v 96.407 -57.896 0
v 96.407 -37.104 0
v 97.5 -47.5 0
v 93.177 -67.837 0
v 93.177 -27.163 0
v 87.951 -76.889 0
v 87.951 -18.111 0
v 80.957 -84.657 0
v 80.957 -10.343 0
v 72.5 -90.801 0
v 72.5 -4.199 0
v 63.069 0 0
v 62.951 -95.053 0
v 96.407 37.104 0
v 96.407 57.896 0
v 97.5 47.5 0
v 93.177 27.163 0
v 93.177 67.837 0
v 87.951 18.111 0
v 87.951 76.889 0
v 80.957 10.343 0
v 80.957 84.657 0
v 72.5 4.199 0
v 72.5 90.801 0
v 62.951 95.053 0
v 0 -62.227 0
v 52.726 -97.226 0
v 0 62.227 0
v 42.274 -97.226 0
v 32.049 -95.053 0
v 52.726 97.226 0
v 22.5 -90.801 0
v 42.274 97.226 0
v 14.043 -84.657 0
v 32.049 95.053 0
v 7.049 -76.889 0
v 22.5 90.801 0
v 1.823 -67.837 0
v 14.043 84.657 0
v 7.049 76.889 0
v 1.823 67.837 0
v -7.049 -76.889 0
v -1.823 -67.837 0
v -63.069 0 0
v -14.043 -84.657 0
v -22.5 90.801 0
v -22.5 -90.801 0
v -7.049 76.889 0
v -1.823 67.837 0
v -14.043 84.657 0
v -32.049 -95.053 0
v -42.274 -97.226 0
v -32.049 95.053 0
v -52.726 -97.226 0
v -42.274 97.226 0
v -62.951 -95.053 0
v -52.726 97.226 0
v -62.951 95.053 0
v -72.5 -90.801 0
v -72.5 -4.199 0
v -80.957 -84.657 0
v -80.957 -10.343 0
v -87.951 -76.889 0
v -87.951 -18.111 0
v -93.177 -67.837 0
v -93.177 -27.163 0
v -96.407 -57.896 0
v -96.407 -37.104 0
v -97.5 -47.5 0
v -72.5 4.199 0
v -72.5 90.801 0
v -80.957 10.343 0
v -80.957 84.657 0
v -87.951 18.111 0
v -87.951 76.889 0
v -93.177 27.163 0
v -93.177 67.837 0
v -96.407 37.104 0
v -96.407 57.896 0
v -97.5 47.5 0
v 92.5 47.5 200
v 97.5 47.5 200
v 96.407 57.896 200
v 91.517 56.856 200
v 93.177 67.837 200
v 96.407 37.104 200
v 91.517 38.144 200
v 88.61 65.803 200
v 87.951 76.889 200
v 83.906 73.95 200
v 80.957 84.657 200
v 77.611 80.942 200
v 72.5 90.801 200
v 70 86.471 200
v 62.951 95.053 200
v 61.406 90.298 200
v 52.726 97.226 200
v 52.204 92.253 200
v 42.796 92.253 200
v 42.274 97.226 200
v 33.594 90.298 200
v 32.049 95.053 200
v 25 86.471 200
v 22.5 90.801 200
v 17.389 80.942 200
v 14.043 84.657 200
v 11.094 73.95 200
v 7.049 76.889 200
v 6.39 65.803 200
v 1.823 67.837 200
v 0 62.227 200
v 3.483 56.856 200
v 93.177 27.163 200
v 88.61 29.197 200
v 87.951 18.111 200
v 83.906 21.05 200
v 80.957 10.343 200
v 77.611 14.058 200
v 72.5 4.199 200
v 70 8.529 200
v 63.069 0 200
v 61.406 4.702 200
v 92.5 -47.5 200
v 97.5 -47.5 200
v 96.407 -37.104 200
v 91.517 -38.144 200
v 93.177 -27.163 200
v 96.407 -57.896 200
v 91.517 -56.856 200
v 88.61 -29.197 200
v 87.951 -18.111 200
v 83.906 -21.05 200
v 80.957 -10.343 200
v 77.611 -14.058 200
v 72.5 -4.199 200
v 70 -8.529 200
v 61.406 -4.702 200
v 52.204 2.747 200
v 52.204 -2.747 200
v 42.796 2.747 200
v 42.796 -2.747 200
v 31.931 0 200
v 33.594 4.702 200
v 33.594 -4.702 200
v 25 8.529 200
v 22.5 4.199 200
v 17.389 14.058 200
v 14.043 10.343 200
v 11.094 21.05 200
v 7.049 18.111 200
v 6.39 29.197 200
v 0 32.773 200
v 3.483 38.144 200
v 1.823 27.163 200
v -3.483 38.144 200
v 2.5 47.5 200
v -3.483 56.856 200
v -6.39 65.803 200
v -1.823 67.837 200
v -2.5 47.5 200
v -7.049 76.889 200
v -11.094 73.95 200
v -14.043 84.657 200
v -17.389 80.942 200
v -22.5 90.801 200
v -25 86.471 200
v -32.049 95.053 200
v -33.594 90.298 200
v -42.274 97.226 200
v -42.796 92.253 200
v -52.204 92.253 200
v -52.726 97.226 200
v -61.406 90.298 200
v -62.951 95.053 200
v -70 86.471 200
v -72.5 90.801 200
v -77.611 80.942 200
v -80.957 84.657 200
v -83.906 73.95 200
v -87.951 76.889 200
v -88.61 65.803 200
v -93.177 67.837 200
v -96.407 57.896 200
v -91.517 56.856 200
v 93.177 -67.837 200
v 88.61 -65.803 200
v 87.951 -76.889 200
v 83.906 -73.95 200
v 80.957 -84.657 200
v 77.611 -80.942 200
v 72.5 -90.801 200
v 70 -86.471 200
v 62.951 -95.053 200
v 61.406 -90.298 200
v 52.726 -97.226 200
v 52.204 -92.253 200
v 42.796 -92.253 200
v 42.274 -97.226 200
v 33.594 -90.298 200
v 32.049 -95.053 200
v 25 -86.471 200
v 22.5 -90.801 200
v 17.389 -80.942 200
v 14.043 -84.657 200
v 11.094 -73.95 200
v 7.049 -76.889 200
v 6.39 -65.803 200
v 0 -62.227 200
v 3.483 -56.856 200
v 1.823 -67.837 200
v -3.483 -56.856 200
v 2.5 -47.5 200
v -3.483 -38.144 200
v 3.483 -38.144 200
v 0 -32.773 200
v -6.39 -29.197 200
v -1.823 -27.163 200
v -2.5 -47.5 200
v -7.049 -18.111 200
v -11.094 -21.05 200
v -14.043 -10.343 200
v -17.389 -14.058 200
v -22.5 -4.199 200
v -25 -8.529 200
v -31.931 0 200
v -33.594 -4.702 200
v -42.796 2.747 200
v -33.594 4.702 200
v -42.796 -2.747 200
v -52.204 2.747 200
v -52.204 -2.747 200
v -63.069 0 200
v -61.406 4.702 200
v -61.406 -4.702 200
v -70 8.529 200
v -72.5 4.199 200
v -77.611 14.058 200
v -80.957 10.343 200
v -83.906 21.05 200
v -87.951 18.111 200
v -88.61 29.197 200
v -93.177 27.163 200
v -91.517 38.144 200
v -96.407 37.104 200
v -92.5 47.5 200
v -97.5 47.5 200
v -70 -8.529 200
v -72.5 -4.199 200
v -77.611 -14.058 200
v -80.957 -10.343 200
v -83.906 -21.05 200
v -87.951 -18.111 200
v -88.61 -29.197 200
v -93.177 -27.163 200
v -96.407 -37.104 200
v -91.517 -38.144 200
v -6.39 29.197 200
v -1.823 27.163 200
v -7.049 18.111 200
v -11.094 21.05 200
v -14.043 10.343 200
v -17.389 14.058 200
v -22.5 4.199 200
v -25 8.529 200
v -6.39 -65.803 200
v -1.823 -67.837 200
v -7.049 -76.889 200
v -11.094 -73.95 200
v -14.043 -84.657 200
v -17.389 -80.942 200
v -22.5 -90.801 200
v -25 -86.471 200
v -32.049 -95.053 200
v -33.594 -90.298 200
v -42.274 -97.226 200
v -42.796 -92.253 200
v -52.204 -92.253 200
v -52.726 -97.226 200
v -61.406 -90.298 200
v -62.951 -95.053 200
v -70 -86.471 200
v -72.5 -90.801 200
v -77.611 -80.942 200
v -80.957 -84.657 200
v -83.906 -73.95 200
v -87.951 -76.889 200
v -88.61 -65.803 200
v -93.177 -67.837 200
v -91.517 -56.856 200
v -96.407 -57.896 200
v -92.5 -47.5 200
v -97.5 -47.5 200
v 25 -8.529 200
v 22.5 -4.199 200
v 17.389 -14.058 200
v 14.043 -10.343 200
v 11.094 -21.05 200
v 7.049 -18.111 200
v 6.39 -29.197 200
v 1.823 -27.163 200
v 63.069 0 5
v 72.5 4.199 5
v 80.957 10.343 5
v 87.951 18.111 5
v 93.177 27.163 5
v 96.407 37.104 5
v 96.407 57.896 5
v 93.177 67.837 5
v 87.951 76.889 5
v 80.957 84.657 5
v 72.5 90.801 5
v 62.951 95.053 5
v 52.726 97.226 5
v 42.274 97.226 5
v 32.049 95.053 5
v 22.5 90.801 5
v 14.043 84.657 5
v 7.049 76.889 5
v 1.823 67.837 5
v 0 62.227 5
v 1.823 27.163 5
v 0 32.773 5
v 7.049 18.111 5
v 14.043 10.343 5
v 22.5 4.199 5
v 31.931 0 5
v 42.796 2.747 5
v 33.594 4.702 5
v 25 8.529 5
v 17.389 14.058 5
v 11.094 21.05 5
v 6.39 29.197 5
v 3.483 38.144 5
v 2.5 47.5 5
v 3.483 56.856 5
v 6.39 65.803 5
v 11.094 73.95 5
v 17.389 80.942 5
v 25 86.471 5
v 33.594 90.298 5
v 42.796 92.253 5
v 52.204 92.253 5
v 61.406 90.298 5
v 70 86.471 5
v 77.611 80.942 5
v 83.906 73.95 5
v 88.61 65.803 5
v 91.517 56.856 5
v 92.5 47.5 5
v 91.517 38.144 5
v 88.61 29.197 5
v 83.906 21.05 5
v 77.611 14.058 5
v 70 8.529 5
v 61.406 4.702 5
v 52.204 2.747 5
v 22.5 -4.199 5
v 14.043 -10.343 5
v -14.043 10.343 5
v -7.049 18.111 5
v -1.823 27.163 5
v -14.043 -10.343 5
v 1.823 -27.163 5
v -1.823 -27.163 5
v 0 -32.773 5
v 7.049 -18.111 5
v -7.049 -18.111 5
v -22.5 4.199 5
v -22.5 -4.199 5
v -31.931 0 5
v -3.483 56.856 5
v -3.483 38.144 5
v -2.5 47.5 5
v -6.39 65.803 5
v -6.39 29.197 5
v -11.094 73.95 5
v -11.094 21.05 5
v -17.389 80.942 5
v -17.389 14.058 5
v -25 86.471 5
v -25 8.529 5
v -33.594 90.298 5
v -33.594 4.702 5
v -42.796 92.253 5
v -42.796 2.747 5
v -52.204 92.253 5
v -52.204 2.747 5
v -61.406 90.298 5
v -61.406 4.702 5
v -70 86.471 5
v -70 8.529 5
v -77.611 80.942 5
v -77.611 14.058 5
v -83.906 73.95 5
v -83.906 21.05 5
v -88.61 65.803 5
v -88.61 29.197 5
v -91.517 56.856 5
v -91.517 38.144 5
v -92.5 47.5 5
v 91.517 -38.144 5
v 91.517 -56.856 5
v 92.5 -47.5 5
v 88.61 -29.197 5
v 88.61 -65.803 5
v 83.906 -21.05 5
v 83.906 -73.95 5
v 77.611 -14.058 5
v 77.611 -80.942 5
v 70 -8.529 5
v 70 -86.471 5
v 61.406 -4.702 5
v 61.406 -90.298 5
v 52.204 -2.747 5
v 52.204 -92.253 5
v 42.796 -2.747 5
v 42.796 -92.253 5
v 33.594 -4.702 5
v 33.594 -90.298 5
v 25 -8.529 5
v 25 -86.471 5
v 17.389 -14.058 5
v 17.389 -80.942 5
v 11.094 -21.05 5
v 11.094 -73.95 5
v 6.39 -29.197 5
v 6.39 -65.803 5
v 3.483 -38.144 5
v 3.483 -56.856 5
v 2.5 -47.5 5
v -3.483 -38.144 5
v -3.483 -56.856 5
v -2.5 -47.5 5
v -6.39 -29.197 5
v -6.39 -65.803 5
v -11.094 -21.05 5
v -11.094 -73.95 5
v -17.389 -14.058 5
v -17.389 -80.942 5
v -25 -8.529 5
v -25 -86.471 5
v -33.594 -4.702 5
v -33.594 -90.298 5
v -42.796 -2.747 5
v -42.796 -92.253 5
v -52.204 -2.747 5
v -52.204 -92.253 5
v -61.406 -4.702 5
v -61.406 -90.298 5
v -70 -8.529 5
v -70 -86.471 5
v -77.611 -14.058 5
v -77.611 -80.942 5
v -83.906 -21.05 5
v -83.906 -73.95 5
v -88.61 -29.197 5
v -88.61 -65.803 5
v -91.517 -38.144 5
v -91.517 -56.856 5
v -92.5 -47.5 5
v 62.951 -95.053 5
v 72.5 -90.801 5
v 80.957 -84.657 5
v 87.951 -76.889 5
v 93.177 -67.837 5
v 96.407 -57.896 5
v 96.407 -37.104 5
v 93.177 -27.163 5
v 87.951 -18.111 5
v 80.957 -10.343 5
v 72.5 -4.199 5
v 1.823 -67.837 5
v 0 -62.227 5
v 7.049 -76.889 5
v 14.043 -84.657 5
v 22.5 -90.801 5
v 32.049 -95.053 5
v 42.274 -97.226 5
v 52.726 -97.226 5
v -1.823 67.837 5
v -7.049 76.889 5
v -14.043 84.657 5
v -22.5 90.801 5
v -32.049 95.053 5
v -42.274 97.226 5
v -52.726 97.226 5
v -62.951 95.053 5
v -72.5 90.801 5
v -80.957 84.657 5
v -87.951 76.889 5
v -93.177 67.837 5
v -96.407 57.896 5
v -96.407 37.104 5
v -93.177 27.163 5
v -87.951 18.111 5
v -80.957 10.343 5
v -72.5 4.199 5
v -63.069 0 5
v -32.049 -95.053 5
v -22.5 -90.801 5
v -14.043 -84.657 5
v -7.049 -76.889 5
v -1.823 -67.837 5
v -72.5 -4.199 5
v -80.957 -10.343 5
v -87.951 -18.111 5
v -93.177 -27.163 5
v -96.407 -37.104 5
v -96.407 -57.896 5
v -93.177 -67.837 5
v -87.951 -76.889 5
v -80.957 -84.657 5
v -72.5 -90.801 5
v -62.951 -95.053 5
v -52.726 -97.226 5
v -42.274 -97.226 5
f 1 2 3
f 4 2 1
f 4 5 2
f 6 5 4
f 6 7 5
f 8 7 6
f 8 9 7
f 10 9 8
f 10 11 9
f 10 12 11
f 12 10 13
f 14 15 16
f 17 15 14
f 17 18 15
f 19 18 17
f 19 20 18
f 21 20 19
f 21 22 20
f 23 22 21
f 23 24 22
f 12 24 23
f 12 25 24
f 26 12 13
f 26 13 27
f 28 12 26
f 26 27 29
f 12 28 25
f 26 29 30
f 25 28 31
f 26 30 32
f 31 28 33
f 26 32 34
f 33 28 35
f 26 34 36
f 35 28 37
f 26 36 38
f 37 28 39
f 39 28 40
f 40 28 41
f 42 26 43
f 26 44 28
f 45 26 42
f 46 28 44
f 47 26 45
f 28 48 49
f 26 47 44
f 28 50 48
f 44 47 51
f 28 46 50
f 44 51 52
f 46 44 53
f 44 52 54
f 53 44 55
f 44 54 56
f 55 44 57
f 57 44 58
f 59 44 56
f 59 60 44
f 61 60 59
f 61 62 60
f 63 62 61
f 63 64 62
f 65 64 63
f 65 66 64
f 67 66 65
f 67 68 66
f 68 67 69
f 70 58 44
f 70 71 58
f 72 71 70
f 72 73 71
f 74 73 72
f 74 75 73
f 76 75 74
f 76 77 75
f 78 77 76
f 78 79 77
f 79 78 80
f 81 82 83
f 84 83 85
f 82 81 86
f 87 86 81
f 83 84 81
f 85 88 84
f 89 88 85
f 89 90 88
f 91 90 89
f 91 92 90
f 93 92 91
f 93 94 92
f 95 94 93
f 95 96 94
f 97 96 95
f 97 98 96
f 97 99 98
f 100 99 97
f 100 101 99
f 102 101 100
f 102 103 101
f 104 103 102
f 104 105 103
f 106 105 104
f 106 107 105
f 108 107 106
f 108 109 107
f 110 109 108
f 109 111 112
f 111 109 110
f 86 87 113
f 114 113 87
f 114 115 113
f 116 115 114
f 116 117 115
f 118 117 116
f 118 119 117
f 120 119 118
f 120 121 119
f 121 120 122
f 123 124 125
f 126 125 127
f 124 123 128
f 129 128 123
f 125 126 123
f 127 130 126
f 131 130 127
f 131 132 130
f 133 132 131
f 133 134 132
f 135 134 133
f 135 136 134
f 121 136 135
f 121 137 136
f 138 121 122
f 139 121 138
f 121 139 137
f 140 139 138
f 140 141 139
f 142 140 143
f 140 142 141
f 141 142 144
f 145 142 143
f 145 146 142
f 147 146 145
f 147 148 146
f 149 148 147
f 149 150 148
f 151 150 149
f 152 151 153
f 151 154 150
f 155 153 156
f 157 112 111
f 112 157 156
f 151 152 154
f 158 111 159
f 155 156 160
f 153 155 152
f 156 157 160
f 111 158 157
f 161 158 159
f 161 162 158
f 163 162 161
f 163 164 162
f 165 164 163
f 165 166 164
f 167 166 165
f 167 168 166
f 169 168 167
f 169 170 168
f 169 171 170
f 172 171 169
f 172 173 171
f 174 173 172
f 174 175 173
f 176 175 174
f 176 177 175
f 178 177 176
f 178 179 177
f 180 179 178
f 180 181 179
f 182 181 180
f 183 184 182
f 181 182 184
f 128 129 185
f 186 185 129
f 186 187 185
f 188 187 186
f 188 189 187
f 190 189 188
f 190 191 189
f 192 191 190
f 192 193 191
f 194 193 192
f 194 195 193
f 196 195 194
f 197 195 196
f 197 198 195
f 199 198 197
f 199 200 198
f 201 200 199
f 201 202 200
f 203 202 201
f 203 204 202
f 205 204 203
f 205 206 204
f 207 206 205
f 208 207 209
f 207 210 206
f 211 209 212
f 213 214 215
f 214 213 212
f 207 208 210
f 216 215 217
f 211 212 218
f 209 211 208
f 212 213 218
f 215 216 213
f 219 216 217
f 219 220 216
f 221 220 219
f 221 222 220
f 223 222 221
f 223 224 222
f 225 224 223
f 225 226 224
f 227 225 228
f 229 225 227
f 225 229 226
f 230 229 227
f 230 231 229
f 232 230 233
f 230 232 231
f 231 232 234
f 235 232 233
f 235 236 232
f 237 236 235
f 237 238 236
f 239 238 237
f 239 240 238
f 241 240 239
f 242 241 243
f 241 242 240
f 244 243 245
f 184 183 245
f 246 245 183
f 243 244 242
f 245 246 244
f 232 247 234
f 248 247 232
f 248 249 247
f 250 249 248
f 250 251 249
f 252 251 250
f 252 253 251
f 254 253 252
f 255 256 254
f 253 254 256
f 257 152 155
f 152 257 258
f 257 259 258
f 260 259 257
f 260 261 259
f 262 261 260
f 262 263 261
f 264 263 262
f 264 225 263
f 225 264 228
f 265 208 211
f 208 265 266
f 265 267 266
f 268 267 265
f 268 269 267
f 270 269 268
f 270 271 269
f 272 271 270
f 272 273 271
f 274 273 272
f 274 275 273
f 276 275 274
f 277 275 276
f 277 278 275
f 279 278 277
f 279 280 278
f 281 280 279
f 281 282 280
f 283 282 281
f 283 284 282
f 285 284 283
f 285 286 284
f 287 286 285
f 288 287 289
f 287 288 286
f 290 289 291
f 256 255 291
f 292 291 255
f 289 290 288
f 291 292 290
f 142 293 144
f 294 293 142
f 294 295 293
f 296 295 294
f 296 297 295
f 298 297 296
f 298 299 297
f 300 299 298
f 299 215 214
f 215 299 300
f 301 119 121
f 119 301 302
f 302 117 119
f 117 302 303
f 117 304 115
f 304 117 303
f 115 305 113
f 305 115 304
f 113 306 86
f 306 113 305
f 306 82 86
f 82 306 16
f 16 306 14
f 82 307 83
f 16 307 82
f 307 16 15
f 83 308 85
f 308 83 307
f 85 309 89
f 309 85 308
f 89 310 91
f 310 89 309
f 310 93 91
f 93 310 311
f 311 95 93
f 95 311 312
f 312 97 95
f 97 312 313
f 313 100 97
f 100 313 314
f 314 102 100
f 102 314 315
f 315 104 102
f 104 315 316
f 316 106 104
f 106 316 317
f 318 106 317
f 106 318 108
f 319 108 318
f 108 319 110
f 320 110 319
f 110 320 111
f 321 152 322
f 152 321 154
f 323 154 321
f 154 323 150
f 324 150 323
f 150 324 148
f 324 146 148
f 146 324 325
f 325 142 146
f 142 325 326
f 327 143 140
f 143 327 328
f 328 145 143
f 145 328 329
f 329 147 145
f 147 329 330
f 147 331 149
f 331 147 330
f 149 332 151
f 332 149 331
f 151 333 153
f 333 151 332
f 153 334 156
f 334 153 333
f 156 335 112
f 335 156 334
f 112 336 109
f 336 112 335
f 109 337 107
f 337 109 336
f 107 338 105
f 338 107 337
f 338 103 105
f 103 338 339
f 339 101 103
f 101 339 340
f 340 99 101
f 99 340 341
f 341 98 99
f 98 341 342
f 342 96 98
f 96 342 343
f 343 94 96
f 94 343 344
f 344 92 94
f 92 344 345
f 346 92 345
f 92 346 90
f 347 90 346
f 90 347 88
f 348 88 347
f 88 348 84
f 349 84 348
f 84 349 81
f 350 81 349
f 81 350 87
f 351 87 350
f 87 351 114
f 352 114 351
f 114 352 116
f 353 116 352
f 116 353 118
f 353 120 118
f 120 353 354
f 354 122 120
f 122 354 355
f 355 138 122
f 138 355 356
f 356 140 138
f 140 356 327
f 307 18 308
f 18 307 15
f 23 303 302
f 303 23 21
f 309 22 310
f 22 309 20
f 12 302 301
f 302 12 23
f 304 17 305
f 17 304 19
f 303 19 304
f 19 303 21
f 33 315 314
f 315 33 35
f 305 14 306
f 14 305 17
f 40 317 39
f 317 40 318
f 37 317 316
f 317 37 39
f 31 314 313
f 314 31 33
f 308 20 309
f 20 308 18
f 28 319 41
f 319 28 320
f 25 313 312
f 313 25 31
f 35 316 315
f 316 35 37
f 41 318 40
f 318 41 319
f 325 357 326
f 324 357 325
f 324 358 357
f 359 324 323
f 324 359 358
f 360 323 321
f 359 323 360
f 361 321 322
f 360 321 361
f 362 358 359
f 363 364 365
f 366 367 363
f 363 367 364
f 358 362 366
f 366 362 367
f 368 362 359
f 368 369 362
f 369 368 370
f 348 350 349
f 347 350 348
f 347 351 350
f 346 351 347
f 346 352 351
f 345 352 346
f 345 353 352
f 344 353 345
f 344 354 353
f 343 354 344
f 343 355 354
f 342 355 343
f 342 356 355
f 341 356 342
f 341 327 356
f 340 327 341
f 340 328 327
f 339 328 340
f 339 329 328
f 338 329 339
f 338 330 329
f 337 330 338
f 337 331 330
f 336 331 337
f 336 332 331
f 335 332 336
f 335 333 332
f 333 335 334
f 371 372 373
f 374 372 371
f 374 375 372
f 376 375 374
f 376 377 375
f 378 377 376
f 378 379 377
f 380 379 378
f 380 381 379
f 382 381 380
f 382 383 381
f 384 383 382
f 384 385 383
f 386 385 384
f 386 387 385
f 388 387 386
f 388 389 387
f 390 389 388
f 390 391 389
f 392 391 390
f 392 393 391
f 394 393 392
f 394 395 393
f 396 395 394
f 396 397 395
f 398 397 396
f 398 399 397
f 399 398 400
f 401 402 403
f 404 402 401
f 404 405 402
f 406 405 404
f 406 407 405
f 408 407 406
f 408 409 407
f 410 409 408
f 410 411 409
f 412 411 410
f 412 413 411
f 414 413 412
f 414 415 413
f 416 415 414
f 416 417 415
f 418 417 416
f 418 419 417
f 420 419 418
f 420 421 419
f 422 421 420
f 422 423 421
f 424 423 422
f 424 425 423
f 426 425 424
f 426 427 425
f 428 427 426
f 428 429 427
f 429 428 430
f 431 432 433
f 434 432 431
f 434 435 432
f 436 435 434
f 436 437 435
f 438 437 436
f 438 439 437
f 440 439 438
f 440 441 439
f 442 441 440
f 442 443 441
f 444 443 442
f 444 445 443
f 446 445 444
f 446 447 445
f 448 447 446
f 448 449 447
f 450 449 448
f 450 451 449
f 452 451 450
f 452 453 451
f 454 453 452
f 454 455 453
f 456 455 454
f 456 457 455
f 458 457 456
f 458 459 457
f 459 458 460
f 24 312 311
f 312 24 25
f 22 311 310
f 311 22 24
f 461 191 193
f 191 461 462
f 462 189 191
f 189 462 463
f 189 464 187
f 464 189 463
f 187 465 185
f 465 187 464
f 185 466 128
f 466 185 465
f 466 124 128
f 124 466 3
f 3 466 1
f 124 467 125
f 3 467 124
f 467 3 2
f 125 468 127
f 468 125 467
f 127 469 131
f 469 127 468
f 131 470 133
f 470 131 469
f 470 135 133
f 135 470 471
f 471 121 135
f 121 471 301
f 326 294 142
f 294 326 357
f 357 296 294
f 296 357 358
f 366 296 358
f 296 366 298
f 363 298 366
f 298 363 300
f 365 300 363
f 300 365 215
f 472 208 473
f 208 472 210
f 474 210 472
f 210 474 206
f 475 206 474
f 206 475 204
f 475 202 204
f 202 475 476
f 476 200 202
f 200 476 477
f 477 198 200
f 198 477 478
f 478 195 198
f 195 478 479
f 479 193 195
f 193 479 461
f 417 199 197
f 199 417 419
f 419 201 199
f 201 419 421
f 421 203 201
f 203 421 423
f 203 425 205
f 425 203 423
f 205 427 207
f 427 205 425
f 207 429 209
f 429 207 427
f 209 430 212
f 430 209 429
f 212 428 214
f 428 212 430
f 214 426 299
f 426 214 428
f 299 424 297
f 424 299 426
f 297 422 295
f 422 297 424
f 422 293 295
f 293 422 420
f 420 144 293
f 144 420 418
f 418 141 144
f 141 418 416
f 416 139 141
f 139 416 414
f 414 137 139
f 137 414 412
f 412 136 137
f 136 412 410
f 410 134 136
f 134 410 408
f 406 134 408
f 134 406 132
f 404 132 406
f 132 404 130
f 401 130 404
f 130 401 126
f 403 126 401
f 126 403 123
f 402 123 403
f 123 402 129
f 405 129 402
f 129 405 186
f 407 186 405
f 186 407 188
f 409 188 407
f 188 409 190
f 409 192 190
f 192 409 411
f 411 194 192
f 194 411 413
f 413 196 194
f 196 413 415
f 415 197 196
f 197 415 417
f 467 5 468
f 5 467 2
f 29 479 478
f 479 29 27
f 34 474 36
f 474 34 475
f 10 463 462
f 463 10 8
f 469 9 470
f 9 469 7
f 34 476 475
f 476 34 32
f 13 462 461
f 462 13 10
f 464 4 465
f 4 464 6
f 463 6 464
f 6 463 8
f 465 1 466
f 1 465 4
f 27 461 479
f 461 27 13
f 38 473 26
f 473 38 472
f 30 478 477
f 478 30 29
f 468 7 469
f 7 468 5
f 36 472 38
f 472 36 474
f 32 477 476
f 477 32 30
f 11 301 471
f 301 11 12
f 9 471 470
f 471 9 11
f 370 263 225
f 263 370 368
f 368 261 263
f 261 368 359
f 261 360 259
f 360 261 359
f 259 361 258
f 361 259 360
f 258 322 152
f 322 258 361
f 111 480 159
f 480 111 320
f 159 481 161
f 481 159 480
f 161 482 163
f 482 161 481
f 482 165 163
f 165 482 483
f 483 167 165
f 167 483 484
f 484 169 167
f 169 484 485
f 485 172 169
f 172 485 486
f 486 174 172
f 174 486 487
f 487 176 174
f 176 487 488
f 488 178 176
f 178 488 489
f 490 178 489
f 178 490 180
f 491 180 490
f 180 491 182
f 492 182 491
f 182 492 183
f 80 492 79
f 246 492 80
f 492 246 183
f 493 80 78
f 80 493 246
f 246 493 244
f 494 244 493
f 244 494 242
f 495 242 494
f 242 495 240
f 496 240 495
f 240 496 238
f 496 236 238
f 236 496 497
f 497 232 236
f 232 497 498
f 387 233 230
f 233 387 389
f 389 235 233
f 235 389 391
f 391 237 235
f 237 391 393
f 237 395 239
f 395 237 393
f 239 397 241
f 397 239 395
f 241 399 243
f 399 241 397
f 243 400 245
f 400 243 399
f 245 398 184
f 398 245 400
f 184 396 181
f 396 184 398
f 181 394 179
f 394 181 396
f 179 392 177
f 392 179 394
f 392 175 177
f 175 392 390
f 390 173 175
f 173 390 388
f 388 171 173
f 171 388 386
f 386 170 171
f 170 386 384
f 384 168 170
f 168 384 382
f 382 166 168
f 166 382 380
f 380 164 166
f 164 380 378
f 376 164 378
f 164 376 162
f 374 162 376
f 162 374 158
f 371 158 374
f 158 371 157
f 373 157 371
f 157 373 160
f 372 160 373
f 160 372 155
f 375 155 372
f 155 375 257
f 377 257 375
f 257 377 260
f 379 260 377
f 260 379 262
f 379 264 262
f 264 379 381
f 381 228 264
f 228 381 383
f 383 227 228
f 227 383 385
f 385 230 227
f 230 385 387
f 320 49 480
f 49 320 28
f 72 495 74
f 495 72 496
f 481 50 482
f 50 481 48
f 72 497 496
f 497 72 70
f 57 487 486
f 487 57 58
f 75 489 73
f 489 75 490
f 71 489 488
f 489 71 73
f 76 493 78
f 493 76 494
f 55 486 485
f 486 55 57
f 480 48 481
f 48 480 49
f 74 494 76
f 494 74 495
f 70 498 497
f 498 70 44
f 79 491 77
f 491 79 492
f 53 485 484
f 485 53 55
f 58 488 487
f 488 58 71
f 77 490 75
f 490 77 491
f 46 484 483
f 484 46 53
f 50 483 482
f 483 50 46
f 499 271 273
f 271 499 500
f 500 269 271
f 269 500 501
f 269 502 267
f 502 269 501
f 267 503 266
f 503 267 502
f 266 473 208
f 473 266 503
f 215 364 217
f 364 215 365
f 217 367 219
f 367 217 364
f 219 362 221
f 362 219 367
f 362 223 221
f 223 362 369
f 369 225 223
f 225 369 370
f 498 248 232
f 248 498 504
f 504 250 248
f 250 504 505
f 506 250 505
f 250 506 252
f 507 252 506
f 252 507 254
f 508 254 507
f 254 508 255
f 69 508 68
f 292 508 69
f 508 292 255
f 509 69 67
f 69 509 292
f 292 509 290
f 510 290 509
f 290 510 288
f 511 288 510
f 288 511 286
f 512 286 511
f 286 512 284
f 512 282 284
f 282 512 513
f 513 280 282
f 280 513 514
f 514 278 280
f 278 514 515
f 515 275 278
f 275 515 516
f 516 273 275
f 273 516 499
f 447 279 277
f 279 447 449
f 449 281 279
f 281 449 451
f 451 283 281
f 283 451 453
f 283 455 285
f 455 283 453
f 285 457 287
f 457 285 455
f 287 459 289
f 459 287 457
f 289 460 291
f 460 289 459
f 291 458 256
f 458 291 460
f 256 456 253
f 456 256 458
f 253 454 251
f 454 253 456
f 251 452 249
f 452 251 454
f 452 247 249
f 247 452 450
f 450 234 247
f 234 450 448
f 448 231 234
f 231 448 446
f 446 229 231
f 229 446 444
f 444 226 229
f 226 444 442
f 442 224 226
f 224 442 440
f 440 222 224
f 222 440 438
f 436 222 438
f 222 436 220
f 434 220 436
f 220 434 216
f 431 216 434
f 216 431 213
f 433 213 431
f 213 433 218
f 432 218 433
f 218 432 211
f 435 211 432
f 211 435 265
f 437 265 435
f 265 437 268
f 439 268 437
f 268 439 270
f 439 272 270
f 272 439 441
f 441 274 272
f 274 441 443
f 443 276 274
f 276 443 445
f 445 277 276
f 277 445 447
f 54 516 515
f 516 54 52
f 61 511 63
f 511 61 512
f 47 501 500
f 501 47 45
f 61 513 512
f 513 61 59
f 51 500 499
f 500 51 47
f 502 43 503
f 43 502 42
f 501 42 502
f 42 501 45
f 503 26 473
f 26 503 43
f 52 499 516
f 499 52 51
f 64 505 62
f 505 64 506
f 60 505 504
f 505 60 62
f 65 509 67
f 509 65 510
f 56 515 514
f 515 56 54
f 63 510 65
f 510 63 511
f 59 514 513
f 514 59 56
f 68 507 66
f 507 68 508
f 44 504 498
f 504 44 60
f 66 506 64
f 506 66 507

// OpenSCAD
module glass(radius, thickness) {
  union() {
    linear_extrude(height=200) {
      difference() {
        circle(radius);
        circle(radius - thickness);
      }
    }
    linear_extrude(height=thickness) {
      circle(radius);
    }
  }
}

module multiglass(radius, thickness) {
  d = radius - thickness/2;
  union()
  {
    linear_extrude(height=thickness)
      square([radius*2, radius*2], center=true);

    for (i=[1,-1],j=[1,-1])
    {
      translate([i*d, j*d])
        glass(radius= radius, thickness= thickness);
    }
  }
}

multiglass(radius = 50, thickness = 5);
